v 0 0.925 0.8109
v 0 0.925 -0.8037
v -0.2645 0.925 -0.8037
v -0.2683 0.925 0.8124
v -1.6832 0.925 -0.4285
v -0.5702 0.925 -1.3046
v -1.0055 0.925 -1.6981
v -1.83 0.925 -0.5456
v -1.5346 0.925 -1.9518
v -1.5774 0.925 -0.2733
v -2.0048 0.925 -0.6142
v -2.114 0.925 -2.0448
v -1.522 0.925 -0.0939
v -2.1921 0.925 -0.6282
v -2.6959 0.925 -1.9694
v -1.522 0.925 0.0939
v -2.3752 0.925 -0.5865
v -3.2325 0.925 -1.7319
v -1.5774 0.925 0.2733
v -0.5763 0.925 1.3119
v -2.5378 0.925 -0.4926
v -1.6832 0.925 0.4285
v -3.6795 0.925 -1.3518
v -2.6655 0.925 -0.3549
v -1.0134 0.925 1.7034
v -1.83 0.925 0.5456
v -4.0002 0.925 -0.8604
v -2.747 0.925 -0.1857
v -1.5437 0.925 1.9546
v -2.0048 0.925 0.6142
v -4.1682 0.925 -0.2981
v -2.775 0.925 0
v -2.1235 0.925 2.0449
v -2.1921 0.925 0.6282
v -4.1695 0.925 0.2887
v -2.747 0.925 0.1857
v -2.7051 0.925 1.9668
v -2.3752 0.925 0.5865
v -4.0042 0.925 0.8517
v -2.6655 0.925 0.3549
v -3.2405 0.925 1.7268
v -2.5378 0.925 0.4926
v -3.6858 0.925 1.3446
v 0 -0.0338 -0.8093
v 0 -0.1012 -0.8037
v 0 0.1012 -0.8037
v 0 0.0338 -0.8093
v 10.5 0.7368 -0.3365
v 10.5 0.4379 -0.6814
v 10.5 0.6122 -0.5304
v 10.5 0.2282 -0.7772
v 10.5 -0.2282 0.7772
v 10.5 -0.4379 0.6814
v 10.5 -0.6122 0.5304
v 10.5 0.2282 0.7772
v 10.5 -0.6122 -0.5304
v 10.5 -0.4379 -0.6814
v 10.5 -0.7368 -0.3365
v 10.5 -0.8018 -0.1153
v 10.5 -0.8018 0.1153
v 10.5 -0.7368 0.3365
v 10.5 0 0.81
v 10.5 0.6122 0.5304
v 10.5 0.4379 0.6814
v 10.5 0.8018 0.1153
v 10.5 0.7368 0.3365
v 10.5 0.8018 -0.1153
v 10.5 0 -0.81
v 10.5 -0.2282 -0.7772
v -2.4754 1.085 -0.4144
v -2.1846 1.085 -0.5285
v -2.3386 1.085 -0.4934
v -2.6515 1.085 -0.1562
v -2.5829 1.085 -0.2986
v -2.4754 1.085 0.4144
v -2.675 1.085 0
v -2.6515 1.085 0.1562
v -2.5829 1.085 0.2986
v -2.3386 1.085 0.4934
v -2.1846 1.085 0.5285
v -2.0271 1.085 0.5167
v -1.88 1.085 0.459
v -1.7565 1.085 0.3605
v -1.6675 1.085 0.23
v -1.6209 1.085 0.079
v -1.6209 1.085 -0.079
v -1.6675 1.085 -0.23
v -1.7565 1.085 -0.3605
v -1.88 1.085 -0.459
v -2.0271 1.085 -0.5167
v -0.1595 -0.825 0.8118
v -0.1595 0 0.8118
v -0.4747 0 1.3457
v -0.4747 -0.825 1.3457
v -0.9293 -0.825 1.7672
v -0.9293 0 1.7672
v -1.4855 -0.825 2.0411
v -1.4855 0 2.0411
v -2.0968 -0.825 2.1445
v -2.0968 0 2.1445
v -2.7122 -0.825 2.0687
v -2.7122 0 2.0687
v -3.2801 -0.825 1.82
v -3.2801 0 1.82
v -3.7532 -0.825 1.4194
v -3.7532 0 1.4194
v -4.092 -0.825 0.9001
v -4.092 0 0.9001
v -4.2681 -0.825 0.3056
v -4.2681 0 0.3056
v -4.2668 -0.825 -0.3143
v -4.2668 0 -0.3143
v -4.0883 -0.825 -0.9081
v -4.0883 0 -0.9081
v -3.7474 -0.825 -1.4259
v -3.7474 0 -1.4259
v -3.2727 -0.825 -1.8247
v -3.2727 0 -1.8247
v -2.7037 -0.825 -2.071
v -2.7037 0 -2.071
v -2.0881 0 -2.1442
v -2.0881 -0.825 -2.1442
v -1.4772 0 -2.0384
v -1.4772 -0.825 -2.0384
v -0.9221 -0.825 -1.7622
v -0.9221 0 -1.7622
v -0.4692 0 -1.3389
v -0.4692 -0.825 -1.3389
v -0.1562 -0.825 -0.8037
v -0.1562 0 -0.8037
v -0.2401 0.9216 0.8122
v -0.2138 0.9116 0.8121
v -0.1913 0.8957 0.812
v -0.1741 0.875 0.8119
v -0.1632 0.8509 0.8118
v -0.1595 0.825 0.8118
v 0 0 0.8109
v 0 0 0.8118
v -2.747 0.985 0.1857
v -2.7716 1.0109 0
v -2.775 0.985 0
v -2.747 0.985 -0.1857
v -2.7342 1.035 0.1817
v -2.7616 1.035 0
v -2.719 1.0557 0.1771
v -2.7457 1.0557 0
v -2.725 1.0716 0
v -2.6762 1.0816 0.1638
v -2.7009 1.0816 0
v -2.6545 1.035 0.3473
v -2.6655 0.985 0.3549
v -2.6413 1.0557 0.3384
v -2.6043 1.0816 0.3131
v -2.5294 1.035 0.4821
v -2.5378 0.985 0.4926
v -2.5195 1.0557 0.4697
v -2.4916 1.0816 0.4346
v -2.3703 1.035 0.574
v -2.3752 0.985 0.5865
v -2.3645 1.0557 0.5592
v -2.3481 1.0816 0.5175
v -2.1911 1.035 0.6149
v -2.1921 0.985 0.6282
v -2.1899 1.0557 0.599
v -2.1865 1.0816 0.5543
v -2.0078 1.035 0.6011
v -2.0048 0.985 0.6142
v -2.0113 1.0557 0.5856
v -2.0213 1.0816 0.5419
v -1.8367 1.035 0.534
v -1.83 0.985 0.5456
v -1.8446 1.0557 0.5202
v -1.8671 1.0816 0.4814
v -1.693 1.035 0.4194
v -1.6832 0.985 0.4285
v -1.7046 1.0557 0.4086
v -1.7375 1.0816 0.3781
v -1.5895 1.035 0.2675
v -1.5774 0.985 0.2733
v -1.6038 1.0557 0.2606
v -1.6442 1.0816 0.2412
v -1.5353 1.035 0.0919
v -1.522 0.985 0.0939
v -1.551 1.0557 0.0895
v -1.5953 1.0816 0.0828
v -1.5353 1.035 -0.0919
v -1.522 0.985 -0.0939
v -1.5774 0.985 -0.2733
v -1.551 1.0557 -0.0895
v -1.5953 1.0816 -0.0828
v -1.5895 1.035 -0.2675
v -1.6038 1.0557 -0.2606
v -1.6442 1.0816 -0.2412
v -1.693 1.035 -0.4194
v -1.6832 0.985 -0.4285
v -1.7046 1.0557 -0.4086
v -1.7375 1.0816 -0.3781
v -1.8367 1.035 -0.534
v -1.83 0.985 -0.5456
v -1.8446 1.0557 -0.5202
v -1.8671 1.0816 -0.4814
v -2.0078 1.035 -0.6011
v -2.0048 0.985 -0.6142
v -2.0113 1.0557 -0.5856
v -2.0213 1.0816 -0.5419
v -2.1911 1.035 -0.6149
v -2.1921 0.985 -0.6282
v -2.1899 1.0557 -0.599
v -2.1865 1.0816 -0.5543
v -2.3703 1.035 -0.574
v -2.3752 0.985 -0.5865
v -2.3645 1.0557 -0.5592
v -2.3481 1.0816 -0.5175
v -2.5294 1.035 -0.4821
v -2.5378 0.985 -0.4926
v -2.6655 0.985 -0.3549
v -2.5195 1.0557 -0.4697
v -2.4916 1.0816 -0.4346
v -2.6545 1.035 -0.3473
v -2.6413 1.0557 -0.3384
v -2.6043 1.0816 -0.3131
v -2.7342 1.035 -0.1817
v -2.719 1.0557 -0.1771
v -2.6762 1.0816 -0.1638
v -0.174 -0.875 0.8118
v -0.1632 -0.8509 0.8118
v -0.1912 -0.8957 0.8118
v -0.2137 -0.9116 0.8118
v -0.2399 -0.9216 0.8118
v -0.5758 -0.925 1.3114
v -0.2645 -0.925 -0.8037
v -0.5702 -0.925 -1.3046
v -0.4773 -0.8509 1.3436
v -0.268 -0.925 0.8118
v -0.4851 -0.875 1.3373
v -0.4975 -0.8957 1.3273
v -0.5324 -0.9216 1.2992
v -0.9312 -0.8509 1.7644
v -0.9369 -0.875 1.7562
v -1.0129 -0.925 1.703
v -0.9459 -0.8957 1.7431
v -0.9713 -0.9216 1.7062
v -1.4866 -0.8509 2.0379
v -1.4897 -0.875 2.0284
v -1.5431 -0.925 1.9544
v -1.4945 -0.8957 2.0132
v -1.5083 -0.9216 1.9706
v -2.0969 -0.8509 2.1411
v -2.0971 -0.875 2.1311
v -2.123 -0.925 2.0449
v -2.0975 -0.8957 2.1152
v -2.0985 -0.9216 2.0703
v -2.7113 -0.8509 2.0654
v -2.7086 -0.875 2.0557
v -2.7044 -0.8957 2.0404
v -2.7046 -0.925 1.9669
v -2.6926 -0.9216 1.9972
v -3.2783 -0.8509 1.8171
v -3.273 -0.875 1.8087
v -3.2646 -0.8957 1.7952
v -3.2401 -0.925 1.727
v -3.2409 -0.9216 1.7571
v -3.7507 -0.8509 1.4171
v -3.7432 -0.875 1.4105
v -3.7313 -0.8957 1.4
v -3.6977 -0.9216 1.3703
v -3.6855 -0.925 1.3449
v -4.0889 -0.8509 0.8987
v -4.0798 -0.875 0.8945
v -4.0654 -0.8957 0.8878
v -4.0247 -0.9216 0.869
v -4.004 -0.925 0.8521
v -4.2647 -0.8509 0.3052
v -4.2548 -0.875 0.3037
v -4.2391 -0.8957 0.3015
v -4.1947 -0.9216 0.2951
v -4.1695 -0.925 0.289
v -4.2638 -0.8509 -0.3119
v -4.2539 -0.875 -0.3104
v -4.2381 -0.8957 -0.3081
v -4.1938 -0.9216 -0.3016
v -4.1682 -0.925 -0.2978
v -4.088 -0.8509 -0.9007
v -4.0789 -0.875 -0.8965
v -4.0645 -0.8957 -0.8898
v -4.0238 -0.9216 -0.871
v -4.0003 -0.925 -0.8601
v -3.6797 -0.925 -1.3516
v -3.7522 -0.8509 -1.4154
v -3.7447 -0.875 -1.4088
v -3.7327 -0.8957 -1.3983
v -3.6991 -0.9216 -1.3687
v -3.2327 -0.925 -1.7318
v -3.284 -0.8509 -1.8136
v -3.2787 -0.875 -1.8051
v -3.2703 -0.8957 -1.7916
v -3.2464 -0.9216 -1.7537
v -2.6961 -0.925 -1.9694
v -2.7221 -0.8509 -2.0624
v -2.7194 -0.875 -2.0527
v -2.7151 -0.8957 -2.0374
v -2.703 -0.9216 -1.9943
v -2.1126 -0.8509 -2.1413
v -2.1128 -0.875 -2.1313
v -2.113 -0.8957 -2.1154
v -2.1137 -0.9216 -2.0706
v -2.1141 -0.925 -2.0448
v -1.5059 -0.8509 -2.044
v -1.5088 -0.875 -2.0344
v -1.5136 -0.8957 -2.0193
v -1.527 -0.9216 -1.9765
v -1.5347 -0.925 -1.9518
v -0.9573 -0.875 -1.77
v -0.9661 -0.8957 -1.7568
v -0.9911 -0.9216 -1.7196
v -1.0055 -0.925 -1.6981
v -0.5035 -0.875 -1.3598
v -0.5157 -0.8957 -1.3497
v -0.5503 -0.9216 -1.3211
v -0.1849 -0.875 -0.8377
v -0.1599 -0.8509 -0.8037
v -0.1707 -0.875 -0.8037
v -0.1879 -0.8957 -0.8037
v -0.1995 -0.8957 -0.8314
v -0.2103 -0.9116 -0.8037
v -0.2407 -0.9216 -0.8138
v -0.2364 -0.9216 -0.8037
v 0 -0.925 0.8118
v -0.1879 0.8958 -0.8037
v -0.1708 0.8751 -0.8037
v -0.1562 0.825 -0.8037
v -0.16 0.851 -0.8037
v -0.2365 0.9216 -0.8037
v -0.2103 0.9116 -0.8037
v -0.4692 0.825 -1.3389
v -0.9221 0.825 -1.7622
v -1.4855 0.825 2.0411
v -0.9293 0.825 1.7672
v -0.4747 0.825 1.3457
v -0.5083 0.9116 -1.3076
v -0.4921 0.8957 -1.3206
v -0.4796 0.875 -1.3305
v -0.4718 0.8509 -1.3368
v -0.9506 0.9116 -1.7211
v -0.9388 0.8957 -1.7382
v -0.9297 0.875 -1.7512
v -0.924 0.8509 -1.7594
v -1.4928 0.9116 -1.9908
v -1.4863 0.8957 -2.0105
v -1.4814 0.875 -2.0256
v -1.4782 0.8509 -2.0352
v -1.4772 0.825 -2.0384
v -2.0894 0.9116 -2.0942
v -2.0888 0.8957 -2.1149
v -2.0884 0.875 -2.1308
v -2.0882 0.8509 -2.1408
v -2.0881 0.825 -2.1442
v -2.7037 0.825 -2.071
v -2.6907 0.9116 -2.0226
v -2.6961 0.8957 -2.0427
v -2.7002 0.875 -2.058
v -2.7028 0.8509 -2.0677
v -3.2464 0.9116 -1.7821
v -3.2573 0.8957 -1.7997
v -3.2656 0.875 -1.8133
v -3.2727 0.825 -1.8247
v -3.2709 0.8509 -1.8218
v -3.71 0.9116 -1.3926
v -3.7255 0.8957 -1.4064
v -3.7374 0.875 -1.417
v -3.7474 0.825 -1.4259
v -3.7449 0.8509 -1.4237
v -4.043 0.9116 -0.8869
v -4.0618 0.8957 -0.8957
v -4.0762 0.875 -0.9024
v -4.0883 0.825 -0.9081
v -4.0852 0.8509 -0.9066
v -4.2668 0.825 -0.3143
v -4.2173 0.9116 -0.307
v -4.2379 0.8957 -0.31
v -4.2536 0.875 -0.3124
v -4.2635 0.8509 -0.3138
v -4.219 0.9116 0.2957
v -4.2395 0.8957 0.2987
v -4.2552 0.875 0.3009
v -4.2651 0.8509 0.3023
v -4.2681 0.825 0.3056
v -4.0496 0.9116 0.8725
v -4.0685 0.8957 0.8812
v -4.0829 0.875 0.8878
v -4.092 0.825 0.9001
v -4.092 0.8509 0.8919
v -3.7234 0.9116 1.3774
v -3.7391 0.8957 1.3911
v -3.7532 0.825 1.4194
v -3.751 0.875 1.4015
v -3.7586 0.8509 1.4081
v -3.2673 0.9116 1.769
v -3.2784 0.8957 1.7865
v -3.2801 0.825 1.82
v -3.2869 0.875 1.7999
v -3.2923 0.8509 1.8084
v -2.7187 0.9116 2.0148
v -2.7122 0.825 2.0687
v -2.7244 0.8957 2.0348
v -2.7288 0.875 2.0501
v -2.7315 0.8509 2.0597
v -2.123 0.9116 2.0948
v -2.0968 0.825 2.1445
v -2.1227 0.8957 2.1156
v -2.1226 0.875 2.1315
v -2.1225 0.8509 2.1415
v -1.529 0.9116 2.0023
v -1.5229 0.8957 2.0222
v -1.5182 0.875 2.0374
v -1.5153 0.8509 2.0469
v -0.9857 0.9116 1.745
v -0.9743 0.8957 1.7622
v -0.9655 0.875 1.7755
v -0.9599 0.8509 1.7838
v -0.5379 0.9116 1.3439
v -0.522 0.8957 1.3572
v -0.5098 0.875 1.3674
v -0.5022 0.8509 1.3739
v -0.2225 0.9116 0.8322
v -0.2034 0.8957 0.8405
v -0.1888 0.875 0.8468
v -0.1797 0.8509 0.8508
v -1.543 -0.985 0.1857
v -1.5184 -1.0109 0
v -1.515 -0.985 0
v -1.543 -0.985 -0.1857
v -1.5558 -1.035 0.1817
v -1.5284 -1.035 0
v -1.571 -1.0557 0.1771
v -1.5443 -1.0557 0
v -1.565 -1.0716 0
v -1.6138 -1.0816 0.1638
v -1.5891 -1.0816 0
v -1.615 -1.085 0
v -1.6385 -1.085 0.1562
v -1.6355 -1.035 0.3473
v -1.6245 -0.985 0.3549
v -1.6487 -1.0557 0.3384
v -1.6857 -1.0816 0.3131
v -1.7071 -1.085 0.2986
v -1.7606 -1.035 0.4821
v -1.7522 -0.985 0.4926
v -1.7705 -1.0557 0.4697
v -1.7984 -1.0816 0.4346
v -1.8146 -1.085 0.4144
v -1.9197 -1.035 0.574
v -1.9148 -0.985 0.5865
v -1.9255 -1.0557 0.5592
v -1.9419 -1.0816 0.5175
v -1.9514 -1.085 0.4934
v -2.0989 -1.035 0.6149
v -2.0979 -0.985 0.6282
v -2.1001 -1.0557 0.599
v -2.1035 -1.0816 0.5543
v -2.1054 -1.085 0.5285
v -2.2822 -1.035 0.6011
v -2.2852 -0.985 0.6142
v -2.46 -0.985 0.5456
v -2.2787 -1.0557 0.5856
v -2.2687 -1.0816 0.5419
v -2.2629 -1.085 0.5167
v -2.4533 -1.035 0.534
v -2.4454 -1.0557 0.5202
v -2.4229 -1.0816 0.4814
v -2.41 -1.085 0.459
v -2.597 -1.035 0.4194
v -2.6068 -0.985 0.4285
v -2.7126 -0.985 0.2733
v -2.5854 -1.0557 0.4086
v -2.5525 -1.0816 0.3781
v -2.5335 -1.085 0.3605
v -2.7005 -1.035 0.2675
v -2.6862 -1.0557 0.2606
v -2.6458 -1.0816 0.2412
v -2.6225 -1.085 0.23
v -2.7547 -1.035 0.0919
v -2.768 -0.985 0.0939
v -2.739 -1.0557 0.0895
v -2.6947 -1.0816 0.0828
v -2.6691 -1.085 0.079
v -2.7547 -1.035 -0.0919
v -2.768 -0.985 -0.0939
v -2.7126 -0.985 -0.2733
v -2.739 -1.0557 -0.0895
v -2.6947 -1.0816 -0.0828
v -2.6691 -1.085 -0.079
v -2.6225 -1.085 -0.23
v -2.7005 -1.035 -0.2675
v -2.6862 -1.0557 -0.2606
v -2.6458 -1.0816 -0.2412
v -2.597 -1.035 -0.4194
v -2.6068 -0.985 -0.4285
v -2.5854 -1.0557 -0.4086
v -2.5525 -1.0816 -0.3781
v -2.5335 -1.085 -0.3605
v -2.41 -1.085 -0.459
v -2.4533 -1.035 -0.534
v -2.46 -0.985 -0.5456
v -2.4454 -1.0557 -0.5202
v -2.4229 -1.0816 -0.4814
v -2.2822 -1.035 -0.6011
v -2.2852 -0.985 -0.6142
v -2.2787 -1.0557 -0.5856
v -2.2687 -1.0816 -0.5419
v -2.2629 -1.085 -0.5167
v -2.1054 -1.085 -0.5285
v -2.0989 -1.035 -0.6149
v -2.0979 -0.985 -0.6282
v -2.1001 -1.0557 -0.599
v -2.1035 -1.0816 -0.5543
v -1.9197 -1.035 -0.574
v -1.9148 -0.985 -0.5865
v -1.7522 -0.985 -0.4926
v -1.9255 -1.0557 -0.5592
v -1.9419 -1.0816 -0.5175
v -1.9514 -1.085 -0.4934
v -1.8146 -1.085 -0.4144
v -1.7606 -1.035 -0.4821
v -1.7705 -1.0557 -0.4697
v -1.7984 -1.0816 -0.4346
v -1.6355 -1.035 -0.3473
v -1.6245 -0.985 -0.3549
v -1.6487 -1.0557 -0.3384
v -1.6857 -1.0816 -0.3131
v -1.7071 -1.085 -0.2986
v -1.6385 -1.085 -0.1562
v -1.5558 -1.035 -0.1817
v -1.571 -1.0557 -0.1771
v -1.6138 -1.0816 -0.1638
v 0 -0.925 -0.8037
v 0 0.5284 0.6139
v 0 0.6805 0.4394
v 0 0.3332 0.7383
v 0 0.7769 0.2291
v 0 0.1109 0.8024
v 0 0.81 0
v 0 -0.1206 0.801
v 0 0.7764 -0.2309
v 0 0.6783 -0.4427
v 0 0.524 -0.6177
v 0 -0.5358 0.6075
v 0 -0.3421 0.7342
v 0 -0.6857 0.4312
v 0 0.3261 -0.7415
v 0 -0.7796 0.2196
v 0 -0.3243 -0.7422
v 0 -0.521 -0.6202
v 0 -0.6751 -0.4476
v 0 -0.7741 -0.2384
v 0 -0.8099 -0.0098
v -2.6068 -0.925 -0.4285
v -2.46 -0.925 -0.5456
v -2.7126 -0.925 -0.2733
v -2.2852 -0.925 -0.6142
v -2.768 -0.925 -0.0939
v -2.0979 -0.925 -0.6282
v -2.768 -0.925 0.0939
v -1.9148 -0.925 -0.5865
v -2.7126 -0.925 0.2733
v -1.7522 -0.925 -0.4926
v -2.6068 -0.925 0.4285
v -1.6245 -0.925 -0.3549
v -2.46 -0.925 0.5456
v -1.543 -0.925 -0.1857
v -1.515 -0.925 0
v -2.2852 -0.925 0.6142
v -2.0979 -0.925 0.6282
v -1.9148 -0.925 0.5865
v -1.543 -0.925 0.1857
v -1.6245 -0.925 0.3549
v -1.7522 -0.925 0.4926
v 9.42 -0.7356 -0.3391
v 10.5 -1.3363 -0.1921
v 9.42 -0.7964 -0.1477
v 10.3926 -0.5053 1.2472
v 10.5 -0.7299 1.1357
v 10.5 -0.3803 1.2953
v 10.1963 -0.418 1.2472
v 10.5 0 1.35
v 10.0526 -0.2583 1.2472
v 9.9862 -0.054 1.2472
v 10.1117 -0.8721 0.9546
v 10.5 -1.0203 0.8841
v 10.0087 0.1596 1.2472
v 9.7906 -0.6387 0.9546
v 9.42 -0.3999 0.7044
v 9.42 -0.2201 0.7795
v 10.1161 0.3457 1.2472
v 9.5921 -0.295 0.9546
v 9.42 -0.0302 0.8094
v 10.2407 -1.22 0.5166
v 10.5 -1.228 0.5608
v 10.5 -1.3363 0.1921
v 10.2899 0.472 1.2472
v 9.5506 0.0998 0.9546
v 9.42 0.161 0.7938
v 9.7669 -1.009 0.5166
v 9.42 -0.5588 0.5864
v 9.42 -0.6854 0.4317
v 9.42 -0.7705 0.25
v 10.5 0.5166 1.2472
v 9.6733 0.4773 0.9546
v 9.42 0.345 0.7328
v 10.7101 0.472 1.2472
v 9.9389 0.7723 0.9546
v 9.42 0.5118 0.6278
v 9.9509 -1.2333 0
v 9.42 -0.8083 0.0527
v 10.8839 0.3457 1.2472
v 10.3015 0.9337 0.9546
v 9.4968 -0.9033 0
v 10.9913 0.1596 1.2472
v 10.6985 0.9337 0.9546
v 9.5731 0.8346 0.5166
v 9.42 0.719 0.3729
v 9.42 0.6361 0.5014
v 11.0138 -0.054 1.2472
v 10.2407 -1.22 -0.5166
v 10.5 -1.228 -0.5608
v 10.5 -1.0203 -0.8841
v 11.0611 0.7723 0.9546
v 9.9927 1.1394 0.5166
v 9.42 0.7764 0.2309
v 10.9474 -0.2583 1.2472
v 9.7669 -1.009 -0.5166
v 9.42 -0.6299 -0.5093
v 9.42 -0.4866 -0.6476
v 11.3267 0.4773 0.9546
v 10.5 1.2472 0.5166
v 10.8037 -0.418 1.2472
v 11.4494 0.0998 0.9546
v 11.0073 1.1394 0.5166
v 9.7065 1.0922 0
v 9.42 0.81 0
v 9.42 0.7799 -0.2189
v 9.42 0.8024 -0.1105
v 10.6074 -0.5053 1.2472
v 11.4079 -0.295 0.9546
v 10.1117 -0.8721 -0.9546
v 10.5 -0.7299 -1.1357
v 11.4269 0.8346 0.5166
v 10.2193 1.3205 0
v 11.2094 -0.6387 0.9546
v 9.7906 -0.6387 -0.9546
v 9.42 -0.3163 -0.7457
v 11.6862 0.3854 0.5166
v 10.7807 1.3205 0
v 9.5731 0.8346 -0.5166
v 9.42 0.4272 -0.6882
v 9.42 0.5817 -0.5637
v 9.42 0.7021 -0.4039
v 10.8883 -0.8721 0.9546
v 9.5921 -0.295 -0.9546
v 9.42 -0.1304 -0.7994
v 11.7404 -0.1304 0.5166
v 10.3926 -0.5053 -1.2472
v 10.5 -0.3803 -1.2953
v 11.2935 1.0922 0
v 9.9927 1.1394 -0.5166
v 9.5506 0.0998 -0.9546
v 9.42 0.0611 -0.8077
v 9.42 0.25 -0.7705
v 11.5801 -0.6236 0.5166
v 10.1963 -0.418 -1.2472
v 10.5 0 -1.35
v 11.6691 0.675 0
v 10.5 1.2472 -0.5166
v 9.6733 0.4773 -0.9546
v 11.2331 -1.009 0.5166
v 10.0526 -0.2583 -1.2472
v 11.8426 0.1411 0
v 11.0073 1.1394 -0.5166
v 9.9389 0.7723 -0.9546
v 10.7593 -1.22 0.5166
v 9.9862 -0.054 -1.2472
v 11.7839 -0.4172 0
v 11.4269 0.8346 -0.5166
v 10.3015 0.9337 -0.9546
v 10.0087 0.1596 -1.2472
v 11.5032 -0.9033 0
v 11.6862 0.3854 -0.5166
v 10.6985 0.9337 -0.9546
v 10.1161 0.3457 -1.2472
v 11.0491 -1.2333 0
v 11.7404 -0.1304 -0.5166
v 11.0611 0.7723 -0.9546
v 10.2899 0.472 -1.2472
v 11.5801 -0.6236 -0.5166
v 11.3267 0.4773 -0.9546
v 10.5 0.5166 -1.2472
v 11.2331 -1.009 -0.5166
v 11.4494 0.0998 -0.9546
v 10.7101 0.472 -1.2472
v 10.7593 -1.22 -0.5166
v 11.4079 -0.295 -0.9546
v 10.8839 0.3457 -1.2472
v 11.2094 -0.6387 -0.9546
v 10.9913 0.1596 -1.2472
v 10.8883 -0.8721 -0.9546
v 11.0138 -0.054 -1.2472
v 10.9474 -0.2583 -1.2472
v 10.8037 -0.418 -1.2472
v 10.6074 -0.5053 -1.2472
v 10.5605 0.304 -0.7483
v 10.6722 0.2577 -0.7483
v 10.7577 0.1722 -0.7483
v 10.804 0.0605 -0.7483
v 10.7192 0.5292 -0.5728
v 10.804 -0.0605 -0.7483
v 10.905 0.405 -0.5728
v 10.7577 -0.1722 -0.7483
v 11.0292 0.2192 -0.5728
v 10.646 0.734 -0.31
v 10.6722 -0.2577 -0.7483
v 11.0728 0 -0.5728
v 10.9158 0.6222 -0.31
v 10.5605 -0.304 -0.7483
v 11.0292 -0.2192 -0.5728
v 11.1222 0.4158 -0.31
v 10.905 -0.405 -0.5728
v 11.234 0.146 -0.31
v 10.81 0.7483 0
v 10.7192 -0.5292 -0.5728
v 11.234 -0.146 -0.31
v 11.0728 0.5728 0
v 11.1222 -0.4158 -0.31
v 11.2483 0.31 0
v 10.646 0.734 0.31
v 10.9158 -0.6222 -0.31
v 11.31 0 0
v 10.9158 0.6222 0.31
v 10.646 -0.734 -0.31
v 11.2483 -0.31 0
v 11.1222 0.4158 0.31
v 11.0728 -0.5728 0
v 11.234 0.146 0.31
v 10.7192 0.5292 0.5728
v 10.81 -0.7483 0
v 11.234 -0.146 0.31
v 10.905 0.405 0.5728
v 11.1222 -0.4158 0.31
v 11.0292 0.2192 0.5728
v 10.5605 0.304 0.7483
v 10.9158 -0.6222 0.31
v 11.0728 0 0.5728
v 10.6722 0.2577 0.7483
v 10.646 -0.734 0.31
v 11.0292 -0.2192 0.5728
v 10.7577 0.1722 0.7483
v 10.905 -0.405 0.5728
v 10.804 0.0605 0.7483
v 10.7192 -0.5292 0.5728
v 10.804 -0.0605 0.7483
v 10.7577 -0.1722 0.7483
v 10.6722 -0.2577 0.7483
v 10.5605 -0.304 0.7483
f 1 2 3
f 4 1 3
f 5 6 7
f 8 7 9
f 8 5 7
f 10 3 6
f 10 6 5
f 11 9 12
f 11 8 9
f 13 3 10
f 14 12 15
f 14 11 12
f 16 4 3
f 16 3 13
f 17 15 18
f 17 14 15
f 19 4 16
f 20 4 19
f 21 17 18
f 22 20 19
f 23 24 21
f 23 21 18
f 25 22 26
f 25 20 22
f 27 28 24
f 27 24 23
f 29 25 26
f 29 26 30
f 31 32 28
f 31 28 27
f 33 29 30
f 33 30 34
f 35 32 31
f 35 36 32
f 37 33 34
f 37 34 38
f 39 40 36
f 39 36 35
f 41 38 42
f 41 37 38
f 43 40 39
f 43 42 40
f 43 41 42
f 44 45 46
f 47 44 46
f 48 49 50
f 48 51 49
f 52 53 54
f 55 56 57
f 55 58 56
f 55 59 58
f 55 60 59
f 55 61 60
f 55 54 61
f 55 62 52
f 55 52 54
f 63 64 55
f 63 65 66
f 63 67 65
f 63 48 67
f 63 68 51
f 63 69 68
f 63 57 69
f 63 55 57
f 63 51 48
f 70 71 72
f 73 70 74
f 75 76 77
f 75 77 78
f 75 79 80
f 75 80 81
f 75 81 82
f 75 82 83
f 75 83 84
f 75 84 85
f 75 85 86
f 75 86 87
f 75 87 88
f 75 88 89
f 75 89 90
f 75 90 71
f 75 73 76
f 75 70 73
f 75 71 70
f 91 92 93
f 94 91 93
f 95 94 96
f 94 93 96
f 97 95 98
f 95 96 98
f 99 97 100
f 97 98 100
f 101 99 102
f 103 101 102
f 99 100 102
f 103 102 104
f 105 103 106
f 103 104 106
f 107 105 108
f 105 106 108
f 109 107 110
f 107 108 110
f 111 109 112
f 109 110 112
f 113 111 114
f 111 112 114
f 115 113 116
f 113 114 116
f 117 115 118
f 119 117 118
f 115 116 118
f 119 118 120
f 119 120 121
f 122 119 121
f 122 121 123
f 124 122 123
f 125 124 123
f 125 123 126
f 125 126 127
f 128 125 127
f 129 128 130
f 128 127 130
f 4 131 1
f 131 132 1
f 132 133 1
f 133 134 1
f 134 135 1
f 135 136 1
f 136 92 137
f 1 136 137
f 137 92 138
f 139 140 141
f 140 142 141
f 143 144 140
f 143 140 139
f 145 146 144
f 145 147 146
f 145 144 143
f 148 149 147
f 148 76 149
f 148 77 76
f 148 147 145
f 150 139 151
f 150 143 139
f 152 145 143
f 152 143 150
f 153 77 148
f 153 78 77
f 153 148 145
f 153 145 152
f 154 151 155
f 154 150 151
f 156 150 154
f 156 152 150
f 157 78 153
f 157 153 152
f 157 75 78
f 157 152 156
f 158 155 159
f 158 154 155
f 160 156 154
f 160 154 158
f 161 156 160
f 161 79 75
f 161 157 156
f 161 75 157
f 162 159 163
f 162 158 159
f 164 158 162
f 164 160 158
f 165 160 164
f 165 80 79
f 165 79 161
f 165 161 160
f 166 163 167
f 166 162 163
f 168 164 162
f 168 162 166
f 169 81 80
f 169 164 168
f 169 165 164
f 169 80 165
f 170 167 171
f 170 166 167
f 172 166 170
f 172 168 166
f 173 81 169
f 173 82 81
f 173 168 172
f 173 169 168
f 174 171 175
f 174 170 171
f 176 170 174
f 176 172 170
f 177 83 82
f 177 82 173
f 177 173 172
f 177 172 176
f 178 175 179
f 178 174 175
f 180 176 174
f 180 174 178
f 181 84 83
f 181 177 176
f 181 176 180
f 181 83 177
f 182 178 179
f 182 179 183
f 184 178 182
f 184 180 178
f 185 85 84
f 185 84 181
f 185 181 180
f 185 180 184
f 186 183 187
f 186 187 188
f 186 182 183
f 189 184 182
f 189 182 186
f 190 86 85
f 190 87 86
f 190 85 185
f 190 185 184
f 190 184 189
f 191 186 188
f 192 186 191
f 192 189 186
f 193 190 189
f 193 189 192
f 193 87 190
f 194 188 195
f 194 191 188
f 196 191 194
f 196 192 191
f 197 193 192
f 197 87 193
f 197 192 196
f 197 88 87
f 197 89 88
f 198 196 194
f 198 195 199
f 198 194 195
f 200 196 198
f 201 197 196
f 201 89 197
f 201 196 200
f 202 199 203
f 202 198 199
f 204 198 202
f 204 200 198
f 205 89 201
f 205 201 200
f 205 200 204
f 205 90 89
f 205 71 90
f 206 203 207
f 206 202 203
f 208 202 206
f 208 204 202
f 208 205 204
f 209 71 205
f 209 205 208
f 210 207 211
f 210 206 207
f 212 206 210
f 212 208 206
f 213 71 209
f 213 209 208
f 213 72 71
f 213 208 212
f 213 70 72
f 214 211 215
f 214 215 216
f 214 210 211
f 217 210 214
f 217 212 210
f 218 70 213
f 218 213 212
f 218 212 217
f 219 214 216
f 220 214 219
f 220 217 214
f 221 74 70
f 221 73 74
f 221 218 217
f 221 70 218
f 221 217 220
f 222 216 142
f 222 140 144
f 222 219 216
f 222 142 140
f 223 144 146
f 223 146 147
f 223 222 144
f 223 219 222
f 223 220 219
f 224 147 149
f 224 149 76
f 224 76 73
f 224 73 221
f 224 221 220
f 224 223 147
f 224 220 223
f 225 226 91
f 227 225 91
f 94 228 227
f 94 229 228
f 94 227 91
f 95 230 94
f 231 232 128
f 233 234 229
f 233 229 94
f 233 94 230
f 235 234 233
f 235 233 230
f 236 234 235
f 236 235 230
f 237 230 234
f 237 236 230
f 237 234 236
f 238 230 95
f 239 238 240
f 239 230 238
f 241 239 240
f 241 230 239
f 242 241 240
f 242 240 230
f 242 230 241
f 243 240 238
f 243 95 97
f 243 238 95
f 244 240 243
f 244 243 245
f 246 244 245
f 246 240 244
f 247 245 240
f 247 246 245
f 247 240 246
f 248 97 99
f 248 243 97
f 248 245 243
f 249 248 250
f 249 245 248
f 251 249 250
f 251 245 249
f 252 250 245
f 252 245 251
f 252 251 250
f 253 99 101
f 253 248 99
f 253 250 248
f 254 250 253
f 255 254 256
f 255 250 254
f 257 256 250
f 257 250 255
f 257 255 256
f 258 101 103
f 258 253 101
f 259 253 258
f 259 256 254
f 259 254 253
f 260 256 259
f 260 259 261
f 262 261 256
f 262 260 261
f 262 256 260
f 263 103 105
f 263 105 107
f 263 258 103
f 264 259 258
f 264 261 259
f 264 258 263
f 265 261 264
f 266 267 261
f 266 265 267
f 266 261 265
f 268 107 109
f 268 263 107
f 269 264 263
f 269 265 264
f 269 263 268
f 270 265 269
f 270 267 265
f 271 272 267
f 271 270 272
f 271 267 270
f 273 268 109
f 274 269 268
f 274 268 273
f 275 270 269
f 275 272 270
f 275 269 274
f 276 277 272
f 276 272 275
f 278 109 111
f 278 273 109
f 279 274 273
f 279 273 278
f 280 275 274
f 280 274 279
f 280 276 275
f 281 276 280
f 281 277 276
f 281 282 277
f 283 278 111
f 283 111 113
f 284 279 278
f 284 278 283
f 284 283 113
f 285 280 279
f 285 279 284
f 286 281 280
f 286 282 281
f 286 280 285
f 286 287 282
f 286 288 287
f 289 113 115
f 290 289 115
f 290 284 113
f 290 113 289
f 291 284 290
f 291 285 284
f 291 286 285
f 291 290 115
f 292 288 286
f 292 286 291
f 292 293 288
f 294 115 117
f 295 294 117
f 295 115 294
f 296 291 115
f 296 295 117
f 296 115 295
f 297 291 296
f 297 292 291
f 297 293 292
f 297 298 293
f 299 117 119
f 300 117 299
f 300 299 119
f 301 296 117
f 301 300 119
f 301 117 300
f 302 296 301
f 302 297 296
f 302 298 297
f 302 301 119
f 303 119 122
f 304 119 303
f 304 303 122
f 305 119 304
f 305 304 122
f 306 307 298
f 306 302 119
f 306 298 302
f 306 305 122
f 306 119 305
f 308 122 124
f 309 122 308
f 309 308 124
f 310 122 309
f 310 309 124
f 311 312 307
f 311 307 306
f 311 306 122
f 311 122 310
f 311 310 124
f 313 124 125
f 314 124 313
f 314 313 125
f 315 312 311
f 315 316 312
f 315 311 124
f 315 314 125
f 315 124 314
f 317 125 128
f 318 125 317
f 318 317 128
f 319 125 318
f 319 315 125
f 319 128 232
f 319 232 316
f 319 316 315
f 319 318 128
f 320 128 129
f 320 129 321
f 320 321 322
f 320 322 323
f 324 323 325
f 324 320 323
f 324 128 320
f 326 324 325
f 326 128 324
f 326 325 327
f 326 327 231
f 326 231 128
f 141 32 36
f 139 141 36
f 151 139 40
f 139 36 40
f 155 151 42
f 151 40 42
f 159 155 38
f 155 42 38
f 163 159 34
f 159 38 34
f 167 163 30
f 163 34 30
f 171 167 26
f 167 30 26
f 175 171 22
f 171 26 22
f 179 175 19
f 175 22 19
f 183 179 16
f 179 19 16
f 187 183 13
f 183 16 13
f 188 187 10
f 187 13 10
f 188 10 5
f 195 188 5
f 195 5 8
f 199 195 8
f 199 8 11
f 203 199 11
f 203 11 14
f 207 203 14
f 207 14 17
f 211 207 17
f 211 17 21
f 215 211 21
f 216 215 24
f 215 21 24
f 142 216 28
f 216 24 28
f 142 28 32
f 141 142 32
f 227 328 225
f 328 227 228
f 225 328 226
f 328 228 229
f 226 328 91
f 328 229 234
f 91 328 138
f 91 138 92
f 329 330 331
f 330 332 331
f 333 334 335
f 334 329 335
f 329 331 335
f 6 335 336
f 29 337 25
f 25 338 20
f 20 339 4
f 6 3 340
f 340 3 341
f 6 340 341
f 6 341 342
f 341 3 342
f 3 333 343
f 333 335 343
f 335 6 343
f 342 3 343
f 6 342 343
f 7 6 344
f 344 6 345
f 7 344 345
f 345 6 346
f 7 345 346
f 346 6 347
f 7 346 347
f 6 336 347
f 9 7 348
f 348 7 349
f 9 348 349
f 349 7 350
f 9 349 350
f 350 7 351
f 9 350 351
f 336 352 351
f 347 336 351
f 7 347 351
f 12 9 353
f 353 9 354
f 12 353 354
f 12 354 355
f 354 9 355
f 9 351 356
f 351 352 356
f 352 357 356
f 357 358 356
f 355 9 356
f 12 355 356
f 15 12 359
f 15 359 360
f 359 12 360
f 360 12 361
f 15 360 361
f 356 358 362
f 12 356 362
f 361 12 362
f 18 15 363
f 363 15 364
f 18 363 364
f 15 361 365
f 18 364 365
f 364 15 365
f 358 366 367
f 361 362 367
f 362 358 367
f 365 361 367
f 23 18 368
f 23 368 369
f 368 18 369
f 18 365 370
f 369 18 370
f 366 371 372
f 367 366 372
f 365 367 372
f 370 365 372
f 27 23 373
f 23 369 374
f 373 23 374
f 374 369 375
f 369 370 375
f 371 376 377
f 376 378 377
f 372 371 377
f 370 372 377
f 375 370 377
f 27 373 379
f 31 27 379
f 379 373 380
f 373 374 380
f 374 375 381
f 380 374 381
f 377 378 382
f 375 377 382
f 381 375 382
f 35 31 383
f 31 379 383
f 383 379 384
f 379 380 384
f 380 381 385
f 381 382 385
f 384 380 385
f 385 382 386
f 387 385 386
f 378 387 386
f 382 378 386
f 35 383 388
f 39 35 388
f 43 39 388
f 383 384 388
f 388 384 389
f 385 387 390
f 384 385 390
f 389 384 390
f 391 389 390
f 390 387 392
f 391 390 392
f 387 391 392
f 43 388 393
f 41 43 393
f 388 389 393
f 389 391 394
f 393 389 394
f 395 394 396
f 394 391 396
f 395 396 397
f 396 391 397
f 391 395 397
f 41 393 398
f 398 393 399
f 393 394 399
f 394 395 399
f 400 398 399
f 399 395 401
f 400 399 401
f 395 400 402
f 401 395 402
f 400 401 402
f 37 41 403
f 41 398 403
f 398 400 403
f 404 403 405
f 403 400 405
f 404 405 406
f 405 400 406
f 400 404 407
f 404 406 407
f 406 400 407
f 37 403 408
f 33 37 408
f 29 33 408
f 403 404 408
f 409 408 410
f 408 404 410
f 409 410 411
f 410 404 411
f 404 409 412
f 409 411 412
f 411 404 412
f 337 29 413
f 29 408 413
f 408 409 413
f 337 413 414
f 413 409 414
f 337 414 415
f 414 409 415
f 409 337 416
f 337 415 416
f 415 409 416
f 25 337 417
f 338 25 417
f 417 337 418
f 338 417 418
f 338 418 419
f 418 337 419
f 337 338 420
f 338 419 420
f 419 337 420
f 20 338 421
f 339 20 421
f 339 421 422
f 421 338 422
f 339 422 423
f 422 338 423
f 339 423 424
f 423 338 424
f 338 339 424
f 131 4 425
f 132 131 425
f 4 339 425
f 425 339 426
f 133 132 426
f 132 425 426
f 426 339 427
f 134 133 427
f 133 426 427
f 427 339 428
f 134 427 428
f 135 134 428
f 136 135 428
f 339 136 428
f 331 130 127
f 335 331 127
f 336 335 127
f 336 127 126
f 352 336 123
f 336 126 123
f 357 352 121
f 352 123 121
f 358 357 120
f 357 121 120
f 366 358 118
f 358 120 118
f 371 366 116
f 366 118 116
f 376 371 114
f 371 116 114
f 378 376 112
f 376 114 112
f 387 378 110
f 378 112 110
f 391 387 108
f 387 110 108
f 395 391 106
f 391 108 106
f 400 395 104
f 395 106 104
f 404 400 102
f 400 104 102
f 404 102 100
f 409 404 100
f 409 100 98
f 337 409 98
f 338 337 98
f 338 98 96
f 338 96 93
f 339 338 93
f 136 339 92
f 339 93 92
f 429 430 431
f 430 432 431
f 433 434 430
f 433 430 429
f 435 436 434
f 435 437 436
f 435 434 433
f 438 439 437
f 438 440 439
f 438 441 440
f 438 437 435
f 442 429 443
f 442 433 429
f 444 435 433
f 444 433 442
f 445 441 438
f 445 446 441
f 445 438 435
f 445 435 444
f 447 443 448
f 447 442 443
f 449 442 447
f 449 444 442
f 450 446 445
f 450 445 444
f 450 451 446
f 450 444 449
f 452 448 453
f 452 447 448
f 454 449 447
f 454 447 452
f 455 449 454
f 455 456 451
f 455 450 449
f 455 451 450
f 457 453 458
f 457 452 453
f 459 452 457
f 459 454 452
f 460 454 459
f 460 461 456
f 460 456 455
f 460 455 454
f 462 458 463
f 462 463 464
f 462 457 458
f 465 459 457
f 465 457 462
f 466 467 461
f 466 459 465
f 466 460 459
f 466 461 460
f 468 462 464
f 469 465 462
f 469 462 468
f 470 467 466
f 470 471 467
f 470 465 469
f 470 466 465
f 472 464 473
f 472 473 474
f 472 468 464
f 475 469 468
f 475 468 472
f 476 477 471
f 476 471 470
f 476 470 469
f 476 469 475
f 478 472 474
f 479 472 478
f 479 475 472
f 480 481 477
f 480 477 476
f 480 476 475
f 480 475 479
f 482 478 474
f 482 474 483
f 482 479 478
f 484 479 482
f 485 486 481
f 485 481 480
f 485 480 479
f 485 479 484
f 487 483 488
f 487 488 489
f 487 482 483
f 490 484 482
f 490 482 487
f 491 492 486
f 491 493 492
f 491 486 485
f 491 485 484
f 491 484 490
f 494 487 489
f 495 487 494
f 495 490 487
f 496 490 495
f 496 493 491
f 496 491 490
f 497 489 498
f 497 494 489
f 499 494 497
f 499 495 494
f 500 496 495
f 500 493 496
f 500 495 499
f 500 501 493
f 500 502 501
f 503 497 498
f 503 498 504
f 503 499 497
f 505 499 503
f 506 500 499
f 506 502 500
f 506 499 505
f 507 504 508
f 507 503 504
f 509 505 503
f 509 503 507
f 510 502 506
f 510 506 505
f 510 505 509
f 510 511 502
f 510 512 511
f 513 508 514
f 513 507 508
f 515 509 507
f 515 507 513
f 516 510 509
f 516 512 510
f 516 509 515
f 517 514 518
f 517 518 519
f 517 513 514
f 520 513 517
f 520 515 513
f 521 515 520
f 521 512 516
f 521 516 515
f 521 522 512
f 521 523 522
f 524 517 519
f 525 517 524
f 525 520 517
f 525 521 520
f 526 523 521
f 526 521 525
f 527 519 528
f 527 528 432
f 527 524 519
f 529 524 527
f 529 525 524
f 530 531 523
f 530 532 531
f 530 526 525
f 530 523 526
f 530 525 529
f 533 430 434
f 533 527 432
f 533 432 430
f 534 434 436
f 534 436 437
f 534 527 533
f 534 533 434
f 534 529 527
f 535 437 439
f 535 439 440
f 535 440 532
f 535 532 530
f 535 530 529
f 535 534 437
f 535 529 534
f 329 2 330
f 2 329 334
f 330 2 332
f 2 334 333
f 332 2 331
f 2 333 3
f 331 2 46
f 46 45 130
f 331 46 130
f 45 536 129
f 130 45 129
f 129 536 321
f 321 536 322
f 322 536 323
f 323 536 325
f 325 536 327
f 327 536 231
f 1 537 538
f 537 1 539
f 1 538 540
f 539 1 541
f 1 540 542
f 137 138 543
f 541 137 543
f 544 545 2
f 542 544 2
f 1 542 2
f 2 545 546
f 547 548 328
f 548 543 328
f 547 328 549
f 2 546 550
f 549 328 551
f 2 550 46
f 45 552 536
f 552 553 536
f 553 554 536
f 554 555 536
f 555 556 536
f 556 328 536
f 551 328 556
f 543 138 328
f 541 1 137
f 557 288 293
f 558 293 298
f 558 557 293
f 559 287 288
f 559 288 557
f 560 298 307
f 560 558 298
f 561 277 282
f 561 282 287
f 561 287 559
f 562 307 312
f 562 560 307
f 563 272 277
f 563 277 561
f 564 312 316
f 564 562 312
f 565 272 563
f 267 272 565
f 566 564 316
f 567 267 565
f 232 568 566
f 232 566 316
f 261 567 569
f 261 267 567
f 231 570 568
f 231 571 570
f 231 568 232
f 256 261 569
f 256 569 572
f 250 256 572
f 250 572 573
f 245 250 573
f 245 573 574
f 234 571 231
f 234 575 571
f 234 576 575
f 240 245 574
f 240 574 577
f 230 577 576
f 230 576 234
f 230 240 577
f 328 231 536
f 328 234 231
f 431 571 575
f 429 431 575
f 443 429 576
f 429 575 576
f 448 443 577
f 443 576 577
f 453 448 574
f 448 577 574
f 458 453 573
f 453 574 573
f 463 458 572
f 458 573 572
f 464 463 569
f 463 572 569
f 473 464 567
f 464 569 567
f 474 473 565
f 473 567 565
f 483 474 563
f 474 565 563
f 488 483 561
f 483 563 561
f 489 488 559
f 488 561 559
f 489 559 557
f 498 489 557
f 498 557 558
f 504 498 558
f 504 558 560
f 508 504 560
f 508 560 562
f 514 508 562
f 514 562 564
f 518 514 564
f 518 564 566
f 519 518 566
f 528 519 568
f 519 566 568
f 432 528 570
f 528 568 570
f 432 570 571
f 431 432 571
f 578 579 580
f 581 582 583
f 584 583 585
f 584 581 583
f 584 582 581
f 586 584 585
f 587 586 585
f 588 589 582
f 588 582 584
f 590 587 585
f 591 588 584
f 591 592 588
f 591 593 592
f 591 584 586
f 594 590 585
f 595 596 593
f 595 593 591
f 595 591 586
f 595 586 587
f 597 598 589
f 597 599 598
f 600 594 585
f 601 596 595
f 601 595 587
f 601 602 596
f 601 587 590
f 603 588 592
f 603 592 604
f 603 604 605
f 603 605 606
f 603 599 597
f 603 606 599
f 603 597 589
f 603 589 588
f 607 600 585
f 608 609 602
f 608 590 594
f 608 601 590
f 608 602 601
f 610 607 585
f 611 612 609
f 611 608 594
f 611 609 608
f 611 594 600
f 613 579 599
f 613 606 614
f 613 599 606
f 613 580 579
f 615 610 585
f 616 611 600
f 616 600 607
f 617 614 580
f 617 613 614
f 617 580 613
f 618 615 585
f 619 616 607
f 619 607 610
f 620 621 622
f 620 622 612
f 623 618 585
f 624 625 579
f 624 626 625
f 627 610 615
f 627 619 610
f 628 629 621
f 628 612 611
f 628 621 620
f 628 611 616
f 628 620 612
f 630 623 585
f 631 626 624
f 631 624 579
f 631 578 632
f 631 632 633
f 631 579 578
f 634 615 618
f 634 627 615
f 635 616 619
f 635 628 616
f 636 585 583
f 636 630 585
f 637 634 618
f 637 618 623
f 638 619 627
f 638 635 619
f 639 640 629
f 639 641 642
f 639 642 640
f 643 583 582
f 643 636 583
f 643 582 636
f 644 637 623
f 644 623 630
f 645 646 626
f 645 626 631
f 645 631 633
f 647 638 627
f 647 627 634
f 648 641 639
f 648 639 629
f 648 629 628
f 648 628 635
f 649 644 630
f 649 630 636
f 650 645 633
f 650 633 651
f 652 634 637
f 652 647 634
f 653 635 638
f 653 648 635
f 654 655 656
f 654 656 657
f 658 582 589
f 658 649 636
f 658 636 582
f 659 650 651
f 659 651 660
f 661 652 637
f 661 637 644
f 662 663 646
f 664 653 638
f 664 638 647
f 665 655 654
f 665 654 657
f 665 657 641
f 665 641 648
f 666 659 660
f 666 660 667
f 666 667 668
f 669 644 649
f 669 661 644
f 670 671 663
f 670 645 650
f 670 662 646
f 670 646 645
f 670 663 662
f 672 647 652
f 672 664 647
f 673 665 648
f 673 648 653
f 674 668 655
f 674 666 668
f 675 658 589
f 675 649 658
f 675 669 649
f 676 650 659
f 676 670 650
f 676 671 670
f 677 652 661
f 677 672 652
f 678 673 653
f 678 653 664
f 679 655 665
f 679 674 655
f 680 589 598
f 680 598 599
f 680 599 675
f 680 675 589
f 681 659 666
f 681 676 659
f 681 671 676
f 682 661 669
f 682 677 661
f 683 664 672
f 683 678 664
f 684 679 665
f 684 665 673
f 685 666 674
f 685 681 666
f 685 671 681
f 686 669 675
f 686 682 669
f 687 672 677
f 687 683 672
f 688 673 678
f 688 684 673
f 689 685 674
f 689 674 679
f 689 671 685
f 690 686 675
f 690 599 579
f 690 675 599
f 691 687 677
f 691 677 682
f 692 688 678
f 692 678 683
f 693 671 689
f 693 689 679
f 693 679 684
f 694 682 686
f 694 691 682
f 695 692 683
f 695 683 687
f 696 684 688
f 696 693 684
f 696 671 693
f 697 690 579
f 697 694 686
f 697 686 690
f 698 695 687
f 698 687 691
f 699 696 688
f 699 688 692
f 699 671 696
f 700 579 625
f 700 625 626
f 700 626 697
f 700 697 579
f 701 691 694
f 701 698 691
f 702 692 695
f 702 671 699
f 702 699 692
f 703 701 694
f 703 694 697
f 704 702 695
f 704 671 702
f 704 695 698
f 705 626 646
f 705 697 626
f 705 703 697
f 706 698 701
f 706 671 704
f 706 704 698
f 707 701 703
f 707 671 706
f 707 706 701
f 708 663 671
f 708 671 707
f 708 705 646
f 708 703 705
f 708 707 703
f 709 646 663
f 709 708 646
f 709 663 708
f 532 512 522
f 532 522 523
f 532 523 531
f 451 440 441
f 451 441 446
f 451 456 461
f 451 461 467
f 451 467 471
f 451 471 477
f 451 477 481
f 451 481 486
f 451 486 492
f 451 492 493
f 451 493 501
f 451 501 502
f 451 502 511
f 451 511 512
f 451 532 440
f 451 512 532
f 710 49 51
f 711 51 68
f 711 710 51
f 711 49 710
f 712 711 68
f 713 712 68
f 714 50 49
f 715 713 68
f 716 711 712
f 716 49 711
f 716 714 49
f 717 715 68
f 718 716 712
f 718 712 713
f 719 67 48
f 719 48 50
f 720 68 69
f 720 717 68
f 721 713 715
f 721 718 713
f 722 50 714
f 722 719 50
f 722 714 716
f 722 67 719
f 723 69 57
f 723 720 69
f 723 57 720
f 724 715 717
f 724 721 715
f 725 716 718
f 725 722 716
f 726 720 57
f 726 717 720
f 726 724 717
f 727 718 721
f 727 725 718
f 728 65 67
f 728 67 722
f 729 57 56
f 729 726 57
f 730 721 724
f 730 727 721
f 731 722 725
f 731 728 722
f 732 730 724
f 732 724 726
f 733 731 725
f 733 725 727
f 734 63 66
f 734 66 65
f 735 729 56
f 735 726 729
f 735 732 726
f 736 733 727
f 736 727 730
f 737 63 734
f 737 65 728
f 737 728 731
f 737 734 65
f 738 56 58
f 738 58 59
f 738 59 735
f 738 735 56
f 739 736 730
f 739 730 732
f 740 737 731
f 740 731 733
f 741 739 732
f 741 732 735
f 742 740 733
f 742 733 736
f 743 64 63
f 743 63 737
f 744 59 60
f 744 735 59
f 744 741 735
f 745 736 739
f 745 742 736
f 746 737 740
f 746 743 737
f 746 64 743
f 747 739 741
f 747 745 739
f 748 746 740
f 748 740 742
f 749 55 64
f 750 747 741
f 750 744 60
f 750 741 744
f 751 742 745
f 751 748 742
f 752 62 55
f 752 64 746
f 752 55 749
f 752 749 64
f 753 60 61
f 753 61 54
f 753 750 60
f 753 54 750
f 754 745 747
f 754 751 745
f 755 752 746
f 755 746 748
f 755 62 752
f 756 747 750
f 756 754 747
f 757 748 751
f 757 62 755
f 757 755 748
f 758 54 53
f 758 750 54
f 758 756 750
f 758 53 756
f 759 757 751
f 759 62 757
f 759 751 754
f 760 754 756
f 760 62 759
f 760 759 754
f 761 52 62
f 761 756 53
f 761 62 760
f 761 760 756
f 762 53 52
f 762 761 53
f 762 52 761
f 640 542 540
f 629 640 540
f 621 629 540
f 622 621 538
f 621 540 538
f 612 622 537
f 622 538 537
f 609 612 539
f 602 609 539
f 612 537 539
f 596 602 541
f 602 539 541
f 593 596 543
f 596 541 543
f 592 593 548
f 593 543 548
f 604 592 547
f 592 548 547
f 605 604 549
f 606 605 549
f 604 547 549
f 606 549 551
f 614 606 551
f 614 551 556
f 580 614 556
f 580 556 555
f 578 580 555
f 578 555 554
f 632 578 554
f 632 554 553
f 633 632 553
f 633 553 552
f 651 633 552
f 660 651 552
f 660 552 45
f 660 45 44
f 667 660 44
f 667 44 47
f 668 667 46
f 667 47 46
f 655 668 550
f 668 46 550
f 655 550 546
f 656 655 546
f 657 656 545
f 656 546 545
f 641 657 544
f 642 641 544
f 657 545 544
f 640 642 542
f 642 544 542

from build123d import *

# Parameters (mm, degrees)
F0_R     = 0.81
F1_DEPTH = 10.5
F3_DEPTH = 0.925
F5_DEPTH = 0.925
F7_R     = 0.63
F8_DEPTH = 0.16
F6_R     = 0.63
F9_DEPTH = 0.16
F10_R    = 0.1


with BuildPart() as f1:
    # F0 (on Right) → F1 (new body)
    with BuildSketch(Plane.YZ):
        Circle(F0_R)
    extrude(amount=F1_DEPTH)

    # F2 (on Front) → F3 (join)
    with BuildSketch(Plane.XZ):
        with BuildLine():
            Line((0, 0.811792), (-0.159548, 0.811792))
            ThreePointArc((-0.159548, 0.811792), (-4.289996, -0.00439), (-0.156242, -0.803658))
            Line((-0.156242, -0.803658), (0, -0.803658))
            Line((0, -0.803658), (0, 0.811792))
        make_face()
    extrude(amount=F3_DEPTH)

    # F4 (on face) → F5 (join)
    with BuildSketch(Plane(origin=(0, 0, 0), x_dir=(-1, 0, 0), z_dir=(0, 1, 0))):
        with BuildLine():
            Line((0, -0.803658), (0.156242, -0.803658))
            ThreePointArc((0.156242, -0.803658), (4.289996, -0.00439), (0.159548, 0.811792))
            Line((0.159548, 0.811792), (0, 0.810896))
            Line((0, 0.810896), (0, 0.81))
            Line((0, 0.81), (0, -0.803658))
        make_face()
    extrude(amount=F5_DEPTH)

    # F7 (on face) → F8 (join)
    with BuildSketch(Plane.XZ.offset(0.925)):
        with Locations((-2.145, 0)):
            Circle(F7_R)
    extrude(amount=F8_DEPTH)

    # F6 (on face) → F9 (join)
    with BuildSketch(Plane(origin=(0, 0.925, 0), x_dir=(-1, 0, 0), z_dir=(0, 1, 0))):
        with Locations((2.145, 0)):
            Circle(F6_R)
    extrude(amount=F9_DEPTH)

    # F10
    f10_edges = [f1.edges().sort_by_distance(p)[0] for p in [
        (-1.515, 1.085, 0),
        (-2.775, -1.085, 0),
        (-4.289996, -0.925, -0.00439),
        (-4.289996, 0.925, -0.00439),
    ]]
    fillet(f10_edges, radius=F10_R)

    # F11 (on face) → F12 (revolve)
    with BuildSketch(Plane.YZ.offset(10.5)):
        with BuildLine():
            Line((0, 0.81), (0, 1.35))
            ThreePointArc((0, 1.35), (-1.35, 0), (0, -1.35))
            Line((0, -1.35), (0, -0.81))
            ThreePointArc((0, -0.81), (-0.81, 0), (0, 0.81))
        make_face()
    revolve(axis=Axis((10.5, 0, 0), (0, 0, -1)))


solid = f1.part
